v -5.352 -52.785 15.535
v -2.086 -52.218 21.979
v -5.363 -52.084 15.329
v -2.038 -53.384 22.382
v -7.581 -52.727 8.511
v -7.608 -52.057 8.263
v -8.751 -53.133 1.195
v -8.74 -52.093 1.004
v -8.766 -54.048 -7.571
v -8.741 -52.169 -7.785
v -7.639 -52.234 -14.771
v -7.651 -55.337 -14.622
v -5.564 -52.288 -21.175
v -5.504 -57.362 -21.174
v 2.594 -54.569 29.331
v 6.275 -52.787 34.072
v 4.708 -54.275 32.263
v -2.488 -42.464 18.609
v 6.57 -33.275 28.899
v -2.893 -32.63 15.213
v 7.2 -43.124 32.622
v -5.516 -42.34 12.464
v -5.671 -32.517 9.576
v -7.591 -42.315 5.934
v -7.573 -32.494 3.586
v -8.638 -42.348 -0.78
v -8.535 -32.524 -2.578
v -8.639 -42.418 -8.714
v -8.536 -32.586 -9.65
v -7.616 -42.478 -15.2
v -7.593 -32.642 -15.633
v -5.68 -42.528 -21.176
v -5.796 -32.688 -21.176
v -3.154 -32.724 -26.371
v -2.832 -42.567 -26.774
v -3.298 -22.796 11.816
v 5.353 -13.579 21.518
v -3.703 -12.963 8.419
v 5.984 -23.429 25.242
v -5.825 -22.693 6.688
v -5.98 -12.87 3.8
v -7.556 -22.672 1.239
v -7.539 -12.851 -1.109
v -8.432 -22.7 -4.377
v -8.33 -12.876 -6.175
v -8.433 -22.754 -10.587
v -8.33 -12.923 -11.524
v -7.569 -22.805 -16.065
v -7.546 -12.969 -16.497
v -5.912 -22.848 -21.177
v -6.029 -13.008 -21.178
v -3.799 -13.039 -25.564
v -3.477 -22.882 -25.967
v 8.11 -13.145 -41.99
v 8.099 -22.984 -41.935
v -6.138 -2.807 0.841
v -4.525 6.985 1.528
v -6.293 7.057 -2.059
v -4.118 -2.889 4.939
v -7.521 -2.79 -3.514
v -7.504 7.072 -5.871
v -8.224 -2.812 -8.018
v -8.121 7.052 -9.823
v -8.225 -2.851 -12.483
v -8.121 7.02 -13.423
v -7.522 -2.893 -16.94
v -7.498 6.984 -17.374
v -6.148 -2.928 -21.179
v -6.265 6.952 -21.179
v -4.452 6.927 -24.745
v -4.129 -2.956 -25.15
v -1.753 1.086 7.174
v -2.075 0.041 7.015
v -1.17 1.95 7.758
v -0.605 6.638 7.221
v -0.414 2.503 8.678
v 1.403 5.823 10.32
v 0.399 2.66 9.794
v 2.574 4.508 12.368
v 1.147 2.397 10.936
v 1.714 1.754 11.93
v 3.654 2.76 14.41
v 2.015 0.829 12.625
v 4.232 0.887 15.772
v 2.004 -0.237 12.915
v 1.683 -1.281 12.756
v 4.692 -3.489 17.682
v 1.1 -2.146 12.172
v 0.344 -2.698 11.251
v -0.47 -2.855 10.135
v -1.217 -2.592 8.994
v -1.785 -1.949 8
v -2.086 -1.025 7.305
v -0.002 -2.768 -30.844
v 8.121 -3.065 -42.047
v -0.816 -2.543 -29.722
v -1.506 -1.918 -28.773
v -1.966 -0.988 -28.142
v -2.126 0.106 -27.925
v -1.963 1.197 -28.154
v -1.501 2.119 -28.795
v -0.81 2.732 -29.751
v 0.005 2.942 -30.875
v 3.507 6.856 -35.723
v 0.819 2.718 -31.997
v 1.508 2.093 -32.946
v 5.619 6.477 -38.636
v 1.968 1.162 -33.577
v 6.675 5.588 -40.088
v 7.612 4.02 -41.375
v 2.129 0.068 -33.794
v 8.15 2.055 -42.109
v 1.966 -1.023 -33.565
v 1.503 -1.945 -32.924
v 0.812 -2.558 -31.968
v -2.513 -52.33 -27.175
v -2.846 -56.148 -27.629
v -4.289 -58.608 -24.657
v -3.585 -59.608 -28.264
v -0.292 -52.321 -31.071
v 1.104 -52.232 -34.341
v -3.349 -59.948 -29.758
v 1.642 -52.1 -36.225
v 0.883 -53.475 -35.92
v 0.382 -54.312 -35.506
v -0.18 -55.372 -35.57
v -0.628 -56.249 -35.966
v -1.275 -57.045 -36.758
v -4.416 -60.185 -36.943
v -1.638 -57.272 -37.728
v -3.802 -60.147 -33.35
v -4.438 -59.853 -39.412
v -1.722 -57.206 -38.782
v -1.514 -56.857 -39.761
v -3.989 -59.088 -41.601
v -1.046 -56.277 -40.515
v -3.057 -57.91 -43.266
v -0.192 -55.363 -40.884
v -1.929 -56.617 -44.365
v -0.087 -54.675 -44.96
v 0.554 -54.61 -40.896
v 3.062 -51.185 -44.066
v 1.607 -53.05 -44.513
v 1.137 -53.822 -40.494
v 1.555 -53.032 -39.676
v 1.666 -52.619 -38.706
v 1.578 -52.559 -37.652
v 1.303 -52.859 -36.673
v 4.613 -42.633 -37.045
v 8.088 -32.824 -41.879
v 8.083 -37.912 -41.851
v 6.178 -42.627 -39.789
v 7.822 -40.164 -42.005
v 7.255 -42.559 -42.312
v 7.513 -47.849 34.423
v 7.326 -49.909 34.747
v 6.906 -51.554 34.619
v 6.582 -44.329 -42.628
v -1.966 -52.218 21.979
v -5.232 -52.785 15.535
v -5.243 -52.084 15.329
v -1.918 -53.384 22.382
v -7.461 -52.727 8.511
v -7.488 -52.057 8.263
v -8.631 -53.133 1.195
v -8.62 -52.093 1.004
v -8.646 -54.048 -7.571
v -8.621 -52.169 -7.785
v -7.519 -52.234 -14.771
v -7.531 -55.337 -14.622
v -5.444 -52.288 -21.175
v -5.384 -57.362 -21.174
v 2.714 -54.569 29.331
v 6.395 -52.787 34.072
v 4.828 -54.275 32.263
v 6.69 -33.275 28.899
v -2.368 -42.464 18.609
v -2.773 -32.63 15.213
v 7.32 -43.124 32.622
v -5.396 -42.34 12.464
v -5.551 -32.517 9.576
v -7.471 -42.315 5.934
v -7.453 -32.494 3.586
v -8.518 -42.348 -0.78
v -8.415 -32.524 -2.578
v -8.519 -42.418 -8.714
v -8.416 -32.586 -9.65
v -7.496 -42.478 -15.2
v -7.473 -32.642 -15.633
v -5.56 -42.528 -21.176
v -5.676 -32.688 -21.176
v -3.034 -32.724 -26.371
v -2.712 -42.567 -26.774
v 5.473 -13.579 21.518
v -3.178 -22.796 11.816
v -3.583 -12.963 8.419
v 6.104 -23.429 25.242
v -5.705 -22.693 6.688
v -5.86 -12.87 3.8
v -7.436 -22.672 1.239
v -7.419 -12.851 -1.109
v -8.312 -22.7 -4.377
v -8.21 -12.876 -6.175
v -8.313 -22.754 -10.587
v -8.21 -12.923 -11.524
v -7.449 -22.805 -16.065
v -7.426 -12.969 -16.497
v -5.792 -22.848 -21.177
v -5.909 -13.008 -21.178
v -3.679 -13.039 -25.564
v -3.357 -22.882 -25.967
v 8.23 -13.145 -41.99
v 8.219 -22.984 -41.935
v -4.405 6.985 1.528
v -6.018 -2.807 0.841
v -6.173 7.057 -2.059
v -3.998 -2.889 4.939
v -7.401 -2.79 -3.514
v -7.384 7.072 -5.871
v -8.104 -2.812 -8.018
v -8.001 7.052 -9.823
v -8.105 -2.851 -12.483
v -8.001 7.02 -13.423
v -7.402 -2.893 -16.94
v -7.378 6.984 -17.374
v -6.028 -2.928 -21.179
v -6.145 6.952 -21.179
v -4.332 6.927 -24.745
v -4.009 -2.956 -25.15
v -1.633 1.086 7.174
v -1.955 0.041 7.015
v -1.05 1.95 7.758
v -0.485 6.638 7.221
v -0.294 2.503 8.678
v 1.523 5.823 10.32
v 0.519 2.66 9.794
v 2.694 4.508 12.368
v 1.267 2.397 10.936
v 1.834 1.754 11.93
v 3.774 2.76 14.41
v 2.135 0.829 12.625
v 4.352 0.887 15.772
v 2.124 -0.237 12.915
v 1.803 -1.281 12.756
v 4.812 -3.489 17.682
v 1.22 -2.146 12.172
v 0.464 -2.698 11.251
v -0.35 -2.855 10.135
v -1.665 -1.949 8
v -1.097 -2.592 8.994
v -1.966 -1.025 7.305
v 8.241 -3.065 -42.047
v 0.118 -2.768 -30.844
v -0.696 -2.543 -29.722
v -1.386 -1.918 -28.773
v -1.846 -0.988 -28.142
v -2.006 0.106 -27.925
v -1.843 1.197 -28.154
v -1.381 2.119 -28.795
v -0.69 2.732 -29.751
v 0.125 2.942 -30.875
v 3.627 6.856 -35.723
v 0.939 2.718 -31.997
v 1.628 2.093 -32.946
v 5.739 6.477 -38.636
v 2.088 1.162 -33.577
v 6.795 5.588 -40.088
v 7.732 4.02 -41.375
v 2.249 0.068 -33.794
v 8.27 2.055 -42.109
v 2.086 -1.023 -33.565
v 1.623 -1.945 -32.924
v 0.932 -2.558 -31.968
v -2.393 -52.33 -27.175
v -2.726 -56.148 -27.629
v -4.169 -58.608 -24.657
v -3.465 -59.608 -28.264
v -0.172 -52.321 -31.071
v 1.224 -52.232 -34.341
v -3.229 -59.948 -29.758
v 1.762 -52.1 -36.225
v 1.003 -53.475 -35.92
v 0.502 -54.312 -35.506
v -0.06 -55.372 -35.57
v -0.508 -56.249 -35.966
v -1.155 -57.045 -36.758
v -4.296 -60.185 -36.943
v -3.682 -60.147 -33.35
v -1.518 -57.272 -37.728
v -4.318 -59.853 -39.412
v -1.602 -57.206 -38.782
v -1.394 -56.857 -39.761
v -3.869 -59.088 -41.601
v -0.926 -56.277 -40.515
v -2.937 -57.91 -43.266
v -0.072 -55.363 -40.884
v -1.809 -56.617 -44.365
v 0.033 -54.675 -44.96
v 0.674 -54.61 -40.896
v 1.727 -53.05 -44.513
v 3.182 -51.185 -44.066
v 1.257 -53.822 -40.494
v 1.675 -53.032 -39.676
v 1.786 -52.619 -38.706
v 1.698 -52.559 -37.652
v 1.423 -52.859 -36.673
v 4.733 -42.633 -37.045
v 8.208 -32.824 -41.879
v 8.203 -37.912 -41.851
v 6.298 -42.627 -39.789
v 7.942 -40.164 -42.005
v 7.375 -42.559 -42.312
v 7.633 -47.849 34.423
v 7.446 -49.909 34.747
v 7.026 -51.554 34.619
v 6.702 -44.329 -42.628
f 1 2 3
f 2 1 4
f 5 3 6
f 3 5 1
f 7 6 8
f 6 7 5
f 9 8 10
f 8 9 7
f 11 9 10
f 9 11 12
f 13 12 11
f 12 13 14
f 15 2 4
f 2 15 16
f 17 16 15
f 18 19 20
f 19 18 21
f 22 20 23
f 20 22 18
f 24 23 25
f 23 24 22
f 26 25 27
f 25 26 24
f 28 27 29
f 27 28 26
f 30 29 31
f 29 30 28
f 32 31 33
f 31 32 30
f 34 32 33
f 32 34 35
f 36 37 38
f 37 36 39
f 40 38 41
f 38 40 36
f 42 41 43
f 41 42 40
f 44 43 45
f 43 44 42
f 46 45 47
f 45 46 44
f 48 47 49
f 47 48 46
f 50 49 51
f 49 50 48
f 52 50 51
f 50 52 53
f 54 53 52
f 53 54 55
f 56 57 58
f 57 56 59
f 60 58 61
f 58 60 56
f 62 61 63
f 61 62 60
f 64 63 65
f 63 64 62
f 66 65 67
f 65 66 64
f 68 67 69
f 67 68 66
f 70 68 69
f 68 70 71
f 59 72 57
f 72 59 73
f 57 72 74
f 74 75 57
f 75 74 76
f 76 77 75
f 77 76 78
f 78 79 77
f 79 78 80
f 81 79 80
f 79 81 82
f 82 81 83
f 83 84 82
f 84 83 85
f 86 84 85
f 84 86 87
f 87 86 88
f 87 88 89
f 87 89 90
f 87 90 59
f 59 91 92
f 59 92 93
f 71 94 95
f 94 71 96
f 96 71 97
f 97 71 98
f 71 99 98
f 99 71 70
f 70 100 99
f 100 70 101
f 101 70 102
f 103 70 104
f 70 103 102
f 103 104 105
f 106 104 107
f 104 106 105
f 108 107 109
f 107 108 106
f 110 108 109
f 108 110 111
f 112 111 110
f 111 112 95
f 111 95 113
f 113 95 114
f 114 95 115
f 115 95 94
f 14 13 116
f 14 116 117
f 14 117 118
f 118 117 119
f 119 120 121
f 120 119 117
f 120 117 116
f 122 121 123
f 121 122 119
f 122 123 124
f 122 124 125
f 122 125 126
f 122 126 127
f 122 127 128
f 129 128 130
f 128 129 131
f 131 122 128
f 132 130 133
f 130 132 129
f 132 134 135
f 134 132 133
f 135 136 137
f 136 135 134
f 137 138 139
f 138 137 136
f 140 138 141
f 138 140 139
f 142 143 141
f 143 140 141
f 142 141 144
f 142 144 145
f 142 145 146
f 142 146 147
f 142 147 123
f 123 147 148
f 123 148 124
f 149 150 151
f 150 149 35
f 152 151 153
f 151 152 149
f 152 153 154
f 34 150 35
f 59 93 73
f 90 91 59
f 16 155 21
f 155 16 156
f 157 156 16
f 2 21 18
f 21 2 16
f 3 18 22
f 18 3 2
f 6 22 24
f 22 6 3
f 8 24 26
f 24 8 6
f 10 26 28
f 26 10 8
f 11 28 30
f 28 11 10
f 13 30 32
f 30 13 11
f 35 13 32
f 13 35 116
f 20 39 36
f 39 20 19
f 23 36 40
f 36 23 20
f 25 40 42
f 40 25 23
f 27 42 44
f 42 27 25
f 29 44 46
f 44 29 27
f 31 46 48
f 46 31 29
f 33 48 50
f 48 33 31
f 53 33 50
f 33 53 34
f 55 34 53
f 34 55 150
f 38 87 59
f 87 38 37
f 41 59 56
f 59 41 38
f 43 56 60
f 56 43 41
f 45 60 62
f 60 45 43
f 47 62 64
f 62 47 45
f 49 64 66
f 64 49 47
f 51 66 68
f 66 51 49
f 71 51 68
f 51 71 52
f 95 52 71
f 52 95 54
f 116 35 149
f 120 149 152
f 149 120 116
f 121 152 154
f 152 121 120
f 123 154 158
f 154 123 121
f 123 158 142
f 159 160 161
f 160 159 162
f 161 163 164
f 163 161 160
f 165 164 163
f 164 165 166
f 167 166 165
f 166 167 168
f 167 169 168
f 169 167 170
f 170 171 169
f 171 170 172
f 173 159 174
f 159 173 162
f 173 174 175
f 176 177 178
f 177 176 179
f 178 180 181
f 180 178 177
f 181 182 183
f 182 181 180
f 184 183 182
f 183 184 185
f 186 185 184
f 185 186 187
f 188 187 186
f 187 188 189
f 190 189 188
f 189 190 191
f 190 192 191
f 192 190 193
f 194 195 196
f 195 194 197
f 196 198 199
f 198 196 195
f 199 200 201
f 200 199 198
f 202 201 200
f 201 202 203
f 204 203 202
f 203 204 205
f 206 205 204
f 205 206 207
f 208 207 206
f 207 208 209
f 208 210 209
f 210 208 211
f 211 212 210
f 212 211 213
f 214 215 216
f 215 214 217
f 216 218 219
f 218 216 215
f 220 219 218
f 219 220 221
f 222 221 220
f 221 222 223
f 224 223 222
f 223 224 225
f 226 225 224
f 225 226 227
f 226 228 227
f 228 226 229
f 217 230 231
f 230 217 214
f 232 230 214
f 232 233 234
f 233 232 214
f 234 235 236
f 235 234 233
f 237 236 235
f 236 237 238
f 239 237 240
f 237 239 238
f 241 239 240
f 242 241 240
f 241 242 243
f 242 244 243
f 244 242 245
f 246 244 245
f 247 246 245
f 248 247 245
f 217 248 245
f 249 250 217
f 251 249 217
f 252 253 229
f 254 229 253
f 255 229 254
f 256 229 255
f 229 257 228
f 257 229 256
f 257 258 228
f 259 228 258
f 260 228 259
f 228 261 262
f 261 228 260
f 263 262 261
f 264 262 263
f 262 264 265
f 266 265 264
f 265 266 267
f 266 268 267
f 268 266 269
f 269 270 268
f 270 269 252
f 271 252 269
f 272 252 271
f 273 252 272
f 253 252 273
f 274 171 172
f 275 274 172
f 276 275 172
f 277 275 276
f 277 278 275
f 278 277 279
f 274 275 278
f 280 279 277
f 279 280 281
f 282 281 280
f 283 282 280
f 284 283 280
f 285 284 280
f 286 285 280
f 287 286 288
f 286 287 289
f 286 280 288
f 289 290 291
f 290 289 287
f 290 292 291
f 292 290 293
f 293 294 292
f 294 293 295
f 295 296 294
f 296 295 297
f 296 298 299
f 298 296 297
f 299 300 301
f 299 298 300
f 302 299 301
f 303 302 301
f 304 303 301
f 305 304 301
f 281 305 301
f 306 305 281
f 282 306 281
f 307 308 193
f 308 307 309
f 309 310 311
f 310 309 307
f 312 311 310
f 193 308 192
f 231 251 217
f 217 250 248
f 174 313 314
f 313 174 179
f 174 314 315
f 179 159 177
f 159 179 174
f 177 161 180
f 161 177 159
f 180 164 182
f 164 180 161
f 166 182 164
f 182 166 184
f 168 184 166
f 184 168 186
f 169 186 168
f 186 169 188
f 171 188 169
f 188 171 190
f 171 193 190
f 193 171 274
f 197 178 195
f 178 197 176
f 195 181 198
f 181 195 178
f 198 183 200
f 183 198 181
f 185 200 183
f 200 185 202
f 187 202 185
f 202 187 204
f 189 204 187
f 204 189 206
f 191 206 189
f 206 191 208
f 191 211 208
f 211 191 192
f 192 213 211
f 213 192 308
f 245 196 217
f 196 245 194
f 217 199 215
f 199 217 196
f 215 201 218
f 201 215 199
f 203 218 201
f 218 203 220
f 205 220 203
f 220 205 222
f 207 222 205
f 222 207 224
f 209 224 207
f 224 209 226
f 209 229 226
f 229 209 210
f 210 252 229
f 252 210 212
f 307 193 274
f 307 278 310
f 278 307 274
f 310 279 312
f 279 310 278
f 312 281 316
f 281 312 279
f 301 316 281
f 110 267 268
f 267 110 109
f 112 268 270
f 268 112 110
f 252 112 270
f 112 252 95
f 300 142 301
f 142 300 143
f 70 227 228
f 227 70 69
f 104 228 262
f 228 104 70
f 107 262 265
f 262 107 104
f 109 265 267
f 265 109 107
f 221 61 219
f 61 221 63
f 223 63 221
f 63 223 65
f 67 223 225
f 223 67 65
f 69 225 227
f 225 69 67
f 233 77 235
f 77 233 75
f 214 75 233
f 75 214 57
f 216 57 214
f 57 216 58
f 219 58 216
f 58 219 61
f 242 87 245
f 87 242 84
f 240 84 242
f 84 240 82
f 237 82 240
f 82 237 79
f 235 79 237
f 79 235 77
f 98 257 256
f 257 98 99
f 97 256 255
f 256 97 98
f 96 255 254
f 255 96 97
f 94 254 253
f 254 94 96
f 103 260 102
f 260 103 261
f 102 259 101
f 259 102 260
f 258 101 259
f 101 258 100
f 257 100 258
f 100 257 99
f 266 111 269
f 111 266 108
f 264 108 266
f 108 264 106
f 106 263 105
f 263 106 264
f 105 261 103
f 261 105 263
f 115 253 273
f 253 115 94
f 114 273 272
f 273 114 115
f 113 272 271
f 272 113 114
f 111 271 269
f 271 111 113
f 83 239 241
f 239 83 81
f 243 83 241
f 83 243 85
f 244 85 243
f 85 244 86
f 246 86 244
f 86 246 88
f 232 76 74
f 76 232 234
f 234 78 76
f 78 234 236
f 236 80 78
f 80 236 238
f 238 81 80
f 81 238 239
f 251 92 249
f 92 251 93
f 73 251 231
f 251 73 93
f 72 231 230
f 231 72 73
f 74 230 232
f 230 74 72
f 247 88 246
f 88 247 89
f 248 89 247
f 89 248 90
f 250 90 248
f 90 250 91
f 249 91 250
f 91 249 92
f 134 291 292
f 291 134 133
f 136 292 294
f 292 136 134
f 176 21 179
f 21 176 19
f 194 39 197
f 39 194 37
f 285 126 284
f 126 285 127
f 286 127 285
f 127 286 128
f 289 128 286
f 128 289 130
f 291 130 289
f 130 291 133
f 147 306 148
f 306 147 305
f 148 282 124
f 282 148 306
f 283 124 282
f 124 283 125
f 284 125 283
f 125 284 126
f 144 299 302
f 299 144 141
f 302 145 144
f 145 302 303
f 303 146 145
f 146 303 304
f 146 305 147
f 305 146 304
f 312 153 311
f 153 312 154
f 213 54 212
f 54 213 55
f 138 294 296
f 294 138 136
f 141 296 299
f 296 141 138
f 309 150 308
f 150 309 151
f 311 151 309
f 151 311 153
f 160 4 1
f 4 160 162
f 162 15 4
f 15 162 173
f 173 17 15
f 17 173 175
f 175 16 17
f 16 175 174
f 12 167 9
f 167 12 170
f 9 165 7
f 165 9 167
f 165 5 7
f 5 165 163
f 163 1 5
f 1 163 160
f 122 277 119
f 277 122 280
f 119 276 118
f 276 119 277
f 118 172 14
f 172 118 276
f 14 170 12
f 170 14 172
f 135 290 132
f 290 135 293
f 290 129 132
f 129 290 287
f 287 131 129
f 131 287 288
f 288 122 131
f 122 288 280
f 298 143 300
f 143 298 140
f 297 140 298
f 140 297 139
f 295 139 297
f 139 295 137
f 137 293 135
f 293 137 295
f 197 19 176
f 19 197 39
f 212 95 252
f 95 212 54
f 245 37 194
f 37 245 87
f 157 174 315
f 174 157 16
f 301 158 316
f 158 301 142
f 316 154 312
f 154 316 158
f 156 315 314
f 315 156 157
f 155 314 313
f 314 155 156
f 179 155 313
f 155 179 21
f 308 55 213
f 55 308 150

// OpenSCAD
use <../lib.scad>
use <s/u768c01s01.scad>
use <s/u768c01s02.scad>
use <s/u768c01s03.scad>
use <s/u768c01s04.scad>
function ldraw_lib__u768p01c01() = [
// 0 Sail 11 x  9 Trapezoidal with Stripes on White Background Pattern (Formed Shape 1)
// 0 Name: u768p01c01.dat
// 0 Author: Philippe Hurbain [Philo]
// 0 !LDRAW_ORG Part UPDATE 2024-05
// 0 !LICENSE Licensed under CC BY 4.0 : see CAreadme.txt
// 
// 0 !HELP Placement on mast:
// 0 !HELP 1 25 0 100 0 1 0 0 0 1 0 0 0 1 4318.dat
// 0 !HELP 1 25 0 92 -24 -1 0 0 0 1 0 0 0 -1 4319.dat
// 
// 0 BFC CERTIFY CCW
  [0,"BFC","CERTIFY"],
  [0,"BFC","CCW"],
// 
// 0 !CATEGORY Sheet Fabric
// 0 !KEYWORDS Enchanted Island, Imperial Trading Post, King Kahuka's Throne
// 0 !KEYWORDS Lagoon Lock-Up, Rock Island Refuge, set 6262, set 6267, set 6273
// 0 !KEYWORDS set 6277, set 6278, set 6292
// 
// 0 !HISTORY 2024-06-30 [OrionP] Official Update 2024-05
// 
// 
// 1 15 0 0 0 1 0 0 0 1 0 0 0 1 s\u768c01s01.dat
  [1,15,0,0,0,1,0,0,0,1,0,0,0,1, ldraw_lib__s__u768c01s01()],
// 1 16 0 0 0 1 0 0 0 1 0 0 0 1 s\u768c01s02.dat
  [1,16,0,0,0,1,0,0,0,1,0,0,0,1, ldraw_lib__s__u768c01s02()],
// 0 BFC INVERTNEXT
  [0,"BFC","INVERTNEXT"],
// 1 15 0.3 0 0 1 0 0 0 1 0 0 0 1 s\u768c01s01.dat
  [1,15,0.3,0,0,1,0,0,0,1,0,0,0,1, ldraw_lib__s__u768c01s01()],
// 0 BFC INVERTNEXT
  [0,"BFC","INVERTNEXT"],
// 1 16 0.3 0 0 1 0 0 0 1 0 0 0 1 s\u768c01s02.dat
  [1,16,0.3,0,0,1,0,0,0,1,0,0,0,1, ldraw_lib__s__u768c01s02()],
// 
// 1 15 0 0 0 1 0 0 0 1 0 0 0 1 s\u768c01s03.dat
  [1,15,0,0,0,1,0,0,0,1,0,0,0,1, ldraw_lib__s__u768c01s03()],
// 1 16 0 0 0 1 0 0 0 1 0 0 0 1 s\u768c01s04.dat
  [1,16,0,0,0,1,0,0,0,1,0,0,0,1, ldraw_lib__s__u768c01s04()],
];
module ldraw_lib__u768p01c01(step=0, col=false, unit=2/5, alt=false, line=0.2, solid=!$preview)
    makepoly(ldraw_lib__u768p01c01(), step=step, col=col, unit=unit, alt=alt, line=line, solid=solid);
ldraw_lib__u768p01c01(line=0.2);
